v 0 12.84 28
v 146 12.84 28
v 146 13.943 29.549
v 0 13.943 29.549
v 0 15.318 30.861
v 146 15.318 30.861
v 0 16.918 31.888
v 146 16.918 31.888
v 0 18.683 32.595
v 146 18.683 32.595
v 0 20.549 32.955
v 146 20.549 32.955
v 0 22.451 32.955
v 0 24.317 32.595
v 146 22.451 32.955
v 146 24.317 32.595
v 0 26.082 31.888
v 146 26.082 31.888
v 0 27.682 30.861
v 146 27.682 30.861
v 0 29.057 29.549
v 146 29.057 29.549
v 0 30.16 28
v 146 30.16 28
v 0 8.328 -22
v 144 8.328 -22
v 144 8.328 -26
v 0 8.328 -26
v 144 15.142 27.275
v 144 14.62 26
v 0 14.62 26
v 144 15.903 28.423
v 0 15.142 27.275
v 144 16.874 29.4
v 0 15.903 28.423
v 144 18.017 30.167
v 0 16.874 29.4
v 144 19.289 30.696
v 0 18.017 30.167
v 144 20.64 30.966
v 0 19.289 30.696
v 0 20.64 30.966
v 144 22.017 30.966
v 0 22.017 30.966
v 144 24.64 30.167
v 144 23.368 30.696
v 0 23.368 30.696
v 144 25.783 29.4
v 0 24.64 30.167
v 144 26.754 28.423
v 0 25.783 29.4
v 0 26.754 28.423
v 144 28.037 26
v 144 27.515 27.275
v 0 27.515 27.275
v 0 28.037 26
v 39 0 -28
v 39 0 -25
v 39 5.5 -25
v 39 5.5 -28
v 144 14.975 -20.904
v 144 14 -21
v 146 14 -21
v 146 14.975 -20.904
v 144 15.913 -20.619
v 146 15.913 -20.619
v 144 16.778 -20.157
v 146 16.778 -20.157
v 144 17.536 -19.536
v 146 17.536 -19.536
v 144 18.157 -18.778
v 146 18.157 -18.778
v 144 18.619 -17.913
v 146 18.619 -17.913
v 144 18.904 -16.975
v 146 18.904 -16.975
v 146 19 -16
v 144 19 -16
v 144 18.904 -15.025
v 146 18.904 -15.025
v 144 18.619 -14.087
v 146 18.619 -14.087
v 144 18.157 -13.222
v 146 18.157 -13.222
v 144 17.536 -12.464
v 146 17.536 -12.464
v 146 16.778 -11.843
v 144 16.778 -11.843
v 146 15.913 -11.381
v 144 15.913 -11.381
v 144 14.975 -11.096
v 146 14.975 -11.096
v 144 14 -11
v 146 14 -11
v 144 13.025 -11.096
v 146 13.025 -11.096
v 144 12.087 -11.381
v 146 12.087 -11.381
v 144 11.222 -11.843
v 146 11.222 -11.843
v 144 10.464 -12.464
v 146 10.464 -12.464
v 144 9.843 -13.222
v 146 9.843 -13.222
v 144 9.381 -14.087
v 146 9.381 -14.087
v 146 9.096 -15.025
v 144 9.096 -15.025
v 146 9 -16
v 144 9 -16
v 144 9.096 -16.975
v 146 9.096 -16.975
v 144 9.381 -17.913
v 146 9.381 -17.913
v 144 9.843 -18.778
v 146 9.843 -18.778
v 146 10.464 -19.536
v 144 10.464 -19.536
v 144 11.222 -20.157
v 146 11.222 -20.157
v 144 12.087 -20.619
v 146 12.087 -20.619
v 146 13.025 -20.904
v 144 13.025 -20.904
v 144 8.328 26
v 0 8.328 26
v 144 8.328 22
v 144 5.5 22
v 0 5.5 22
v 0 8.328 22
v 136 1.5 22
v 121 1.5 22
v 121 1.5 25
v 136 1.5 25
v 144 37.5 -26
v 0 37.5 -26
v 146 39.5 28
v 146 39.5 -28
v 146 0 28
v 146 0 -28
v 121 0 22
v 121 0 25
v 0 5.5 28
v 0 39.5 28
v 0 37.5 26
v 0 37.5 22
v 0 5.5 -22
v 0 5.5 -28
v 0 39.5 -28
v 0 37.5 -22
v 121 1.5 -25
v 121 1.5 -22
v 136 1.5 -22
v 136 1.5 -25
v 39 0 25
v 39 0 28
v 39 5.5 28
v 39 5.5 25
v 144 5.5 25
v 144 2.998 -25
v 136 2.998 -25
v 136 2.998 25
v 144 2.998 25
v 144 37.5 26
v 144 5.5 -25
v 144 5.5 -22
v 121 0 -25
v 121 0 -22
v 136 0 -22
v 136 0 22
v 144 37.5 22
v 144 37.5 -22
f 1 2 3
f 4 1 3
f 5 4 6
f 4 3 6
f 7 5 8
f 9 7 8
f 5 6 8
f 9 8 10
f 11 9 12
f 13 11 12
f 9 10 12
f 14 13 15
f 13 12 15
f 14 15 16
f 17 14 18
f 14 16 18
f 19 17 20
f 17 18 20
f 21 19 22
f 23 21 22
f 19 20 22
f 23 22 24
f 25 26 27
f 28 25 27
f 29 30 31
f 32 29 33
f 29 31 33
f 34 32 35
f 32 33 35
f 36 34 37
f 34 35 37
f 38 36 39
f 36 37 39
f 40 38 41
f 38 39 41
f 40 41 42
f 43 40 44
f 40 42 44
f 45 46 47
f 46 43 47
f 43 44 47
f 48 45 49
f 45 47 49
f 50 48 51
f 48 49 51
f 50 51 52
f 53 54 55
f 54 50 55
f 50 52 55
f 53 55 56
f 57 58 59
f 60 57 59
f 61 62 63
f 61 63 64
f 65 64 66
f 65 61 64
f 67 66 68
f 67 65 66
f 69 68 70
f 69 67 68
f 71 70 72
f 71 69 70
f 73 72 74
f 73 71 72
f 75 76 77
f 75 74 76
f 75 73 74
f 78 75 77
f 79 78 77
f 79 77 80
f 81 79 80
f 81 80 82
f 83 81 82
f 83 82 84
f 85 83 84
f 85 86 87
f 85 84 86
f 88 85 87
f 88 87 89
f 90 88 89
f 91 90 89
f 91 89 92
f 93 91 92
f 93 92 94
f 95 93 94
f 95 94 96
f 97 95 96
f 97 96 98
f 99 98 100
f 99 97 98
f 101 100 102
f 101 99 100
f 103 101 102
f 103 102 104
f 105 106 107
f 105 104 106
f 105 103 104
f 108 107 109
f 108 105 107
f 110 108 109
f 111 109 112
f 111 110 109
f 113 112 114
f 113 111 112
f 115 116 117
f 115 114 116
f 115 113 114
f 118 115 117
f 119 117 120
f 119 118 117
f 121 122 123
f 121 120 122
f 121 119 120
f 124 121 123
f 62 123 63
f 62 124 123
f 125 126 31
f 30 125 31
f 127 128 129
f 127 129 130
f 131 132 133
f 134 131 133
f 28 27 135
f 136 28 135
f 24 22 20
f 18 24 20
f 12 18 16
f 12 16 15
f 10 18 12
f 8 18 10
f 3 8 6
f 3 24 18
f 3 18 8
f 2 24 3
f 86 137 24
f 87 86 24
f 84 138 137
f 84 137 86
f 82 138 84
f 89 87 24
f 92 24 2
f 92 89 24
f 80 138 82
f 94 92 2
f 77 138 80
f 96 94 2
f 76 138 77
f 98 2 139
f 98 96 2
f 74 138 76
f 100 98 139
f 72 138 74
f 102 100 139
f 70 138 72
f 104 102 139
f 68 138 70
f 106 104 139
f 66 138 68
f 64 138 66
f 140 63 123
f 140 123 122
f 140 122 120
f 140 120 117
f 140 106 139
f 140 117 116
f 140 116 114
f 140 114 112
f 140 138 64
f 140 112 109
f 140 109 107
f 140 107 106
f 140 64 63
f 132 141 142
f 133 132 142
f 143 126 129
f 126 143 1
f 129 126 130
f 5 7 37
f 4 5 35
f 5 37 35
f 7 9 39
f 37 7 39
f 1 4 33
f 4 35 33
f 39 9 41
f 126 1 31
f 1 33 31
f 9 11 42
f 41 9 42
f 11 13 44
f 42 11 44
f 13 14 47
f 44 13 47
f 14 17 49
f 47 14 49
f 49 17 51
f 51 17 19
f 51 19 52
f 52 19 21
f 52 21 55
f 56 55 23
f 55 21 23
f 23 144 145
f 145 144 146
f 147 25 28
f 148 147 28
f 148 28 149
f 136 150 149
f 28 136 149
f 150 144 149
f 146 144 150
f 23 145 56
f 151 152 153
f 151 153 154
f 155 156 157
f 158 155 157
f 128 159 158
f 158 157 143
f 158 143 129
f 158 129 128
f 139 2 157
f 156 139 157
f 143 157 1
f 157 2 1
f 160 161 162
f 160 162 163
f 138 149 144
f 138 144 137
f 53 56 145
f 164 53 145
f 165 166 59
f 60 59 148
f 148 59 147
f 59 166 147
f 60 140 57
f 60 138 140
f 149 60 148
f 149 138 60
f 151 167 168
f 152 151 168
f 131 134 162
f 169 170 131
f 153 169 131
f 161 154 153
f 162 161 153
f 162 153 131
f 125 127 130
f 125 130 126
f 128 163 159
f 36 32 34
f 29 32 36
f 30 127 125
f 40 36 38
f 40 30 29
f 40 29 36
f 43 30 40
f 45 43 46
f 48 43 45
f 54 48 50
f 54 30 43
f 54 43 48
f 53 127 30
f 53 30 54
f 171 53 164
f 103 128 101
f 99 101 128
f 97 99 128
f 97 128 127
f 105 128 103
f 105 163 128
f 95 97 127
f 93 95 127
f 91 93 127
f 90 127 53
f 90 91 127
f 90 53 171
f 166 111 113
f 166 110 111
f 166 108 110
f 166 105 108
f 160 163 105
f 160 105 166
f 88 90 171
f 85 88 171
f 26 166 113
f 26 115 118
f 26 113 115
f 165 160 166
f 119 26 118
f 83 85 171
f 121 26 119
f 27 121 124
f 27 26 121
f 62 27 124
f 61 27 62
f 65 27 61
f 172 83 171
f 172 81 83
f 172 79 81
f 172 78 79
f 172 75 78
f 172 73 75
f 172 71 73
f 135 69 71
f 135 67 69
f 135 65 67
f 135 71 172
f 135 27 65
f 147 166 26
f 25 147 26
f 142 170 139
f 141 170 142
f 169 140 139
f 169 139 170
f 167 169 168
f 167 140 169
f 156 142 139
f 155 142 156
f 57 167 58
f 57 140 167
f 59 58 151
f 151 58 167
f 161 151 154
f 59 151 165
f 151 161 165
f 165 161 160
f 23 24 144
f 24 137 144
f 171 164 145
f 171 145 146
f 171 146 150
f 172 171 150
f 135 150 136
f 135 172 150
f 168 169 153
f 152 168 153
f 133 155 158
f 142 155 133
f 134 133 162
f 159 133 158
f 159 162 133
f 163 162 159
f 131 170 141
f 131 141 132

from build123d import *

# Parameters (mm, degrees)
BOSS_EXTRUDE1_DEPTH     = 144
SKETCH2_W               = 4
SKETCH2_H               = 29.171572875
CUT_EXTRUDE1_DEPTH      = 152.921854912
BOSS_EXTRUDE2_DEPTH     = 144
CUT_EXTRUDE2_DEPTH      = 153.922365925
CUT_EXTRUDE2_DEPTH_BACK = 153.922365925
CUT_EXTRUDE3_DEPTH      = 162.298636076
CUT_EXTRUDE3_DEPTH_BACK = 162.298636076
SKETCH6_W               = 39
SKETCH6_H               = 5.5
BOSS_EXTRUDE3_DEPTH     = 56
BOSS_EXTRUDE5_START     = 3
BOSS_EXTRUDE5_DEPTH     = 3
CUT_EXTRUDE5_DEPTH      = 1
CUT_EXTRUDE6_DEPTH      = 155.807138078
CUT_EXTRUDE6_DEPTH_BACK = 155.807138078
SKETCH16_R              = 5
SKETCH17_W              = 82
SKETCH17_H              = 50
CUT_EXTRUDE7_DEPTH      = 3


with BuildPart() as part:
    # Sketch1 → Boss-Extrude1 (new body)
    with BuildSketch(Plane(origin=(0, 0, 0), x_dir=(0, 0, -1), z_dir=(1, 0, 0))):
        Polygon((0, 39.5), (28, 39.5), (28, 0), (22, 0), (22, 1.5), (25, 1.5), (25, 5.5), (22, 5.5), (22, 37.5), (0, 37.5), align=None)
    boss_extrude1 = extrude(amount=BOSS_EXTRUDE1_DEPTH)

    # Mirror1: Boss-Extrude1 across plane
    add(boss_extrude1.mirror(Plane.XY))

    # Sketch2 → Cut-Extrude1 (cut, symmetric)
    with BuildSketch(Plane(origin=(144, 0, 0), x_dir=(0, 0, -1), z_dir=(1, 0, 0))):
        with Locations((24, 22.914213563)):
            Rectangle(SKETCH2_W, SKETCH2_H)
    cut_extrude1 = extrude(amount=CUT_EXTRUDE1_DEPTH, both=True, mode=Mode.SUBTRACT)

    # Mirror2: Cut-Extrude1 across plane
    add(cut_extrude1.mirror(Plane.XY), mode=Mode.SUBTRACT)

    # Sketch3 → Boss-Extrude2 (add)
    with BuildSketch(Plane(origin=(144, 0, 0), x_dir=(0, 0, -1), z_dir=(1, 0, 0))):
        with BuildLine():
            Line((-28, 30.160254038), (-28, 12.839745962))
            ThreePointArc((-28, 12.839745962), (-33, 21.5), (-28, 30.160254038))
        make_face()
    extrude(amount=-BOSS_EXTRUDE2_DEPTH)

    # Sketch4 → Cut-Extrude2 (cut, two sides: drawn at the far end of the back side and taken through both)
    with BuildSketch(Plane(origin=(144, 0, 0), x_dir=(0, 0, -1), z_dir=(1, 0, 0)).offset(-CUT_EXTRUDE2_DEPTH_BACK)):
        with BuildLine():
            Line((-26, 28.036631057), (-26, 14.620223192))
            ThreePointArc((-26, 14.620223192), (-31, 21.328427125), (-26, 28.036631057))
        make_face()
    extrude(amount=CUT_EXTRUDE2_DEPTH + CUT_EXTRUDE2_DEPTH_BACK, mode=Mode.SUBTRACT)

    # Sketch6 → Cut-Extrude3 (cut, two sides: drawn at the far end of the back side and taken through both)
    with BuildSketch(Plane(origin=(0, 0, -28), x_dir=(-1, 0, 0), z_dir=(0, 0, -1)).offset(-CUT_EXTRUDE3_DEPTH_BACK)):
        with Locations((-19.5, 2.75)):
            Rectangle(SKETCH6_W, SKETCH6_H)
    extrude(amount=CUT_EXTRUDE3_DEPTH + CUT_EXTRUDE3_DEPTH_BACK, mode=Mode.SUBTRACT)

    # Sketch7 → Boss-Extrude3 (add)
    with BuildSketch(Plane(origin=(0, 0, -28), x_dir=(-1, 0, 0), z_dir=(0, 0, -1))):
        Polygon((-144, 39.5), (-146, 39.5), (-146, 0), (-136, 0), (-136, 2.997720077), (-144, 2.997720077), align=None)
    extrude(amount=-BOSS_EXTRUDE3_DEPTH)

    # Sketch10 → Boss-Extrude5 (add)
    with BuildSketch(Plane(origin=(144, 0, 0), x_dir=(0, 0, -1), z_dir=(1, 0, 0)).offset(BOSS_EXTRUDE5_START)):
        with BuildLine():
            Line((-28, 30.160254038), (-28, 12.839745962))
            ThreePointArc((-28, 12.839745962), (-33, 21.5), (-28, 30.160254038))
        make_face()
    extrude(amount=-BOSS_EXTRUDE5_DEPTH)

    # Sketch15 → Cut-Extrude5 (cut)
    with BuildSketch(Plane(origin=(147, 0, 0), x_dir=(0, 0, -1), z_dir=(1, 0, 0))):
        with BuildLine():
            Line((-28, 12.839745962), (-28, 30.160254038))
            ThreePointArc((-28, 30.160254038), (-33, 21.5), (-28, 12.839745962))
        make_face()
    extrude(amount=-CUT_EXTRUDE5_DEPTH, mode=Mode.SUBTRACT)

    # Sketch16 → Cut-Extrude6 (cut, two sides: drawn at the far end of the back side and taken through both)
    with BuildSketch(Plane(origin=(146, 0, 0), x_dir=(0, 0, -1), z_dir=(1, 0, 0)).offset(-CUT_EXTRUDE6_DEPTH_BACK)):
        with Locations((16, 14)):
            Circle(SKETCH16_R)
    extrude(amount=CUT_EXTRUDE6_DEPTH + CUT_EXTRUDE6_DEPTH_BACK, mode=Mode.SUBTRACT)

    # Sketch17 → Cut-Extrude7 (cut)
    with BuildSketch(Plane.XZ):
        with Locations((80, 0)):
            Rectangle(SKETCH17_W, SKETCH17_H)
    extrude(amount=-CUT_EXTRUDE7_DEPTH, mode=Mode.SUBTRACT)


solid = part.part
